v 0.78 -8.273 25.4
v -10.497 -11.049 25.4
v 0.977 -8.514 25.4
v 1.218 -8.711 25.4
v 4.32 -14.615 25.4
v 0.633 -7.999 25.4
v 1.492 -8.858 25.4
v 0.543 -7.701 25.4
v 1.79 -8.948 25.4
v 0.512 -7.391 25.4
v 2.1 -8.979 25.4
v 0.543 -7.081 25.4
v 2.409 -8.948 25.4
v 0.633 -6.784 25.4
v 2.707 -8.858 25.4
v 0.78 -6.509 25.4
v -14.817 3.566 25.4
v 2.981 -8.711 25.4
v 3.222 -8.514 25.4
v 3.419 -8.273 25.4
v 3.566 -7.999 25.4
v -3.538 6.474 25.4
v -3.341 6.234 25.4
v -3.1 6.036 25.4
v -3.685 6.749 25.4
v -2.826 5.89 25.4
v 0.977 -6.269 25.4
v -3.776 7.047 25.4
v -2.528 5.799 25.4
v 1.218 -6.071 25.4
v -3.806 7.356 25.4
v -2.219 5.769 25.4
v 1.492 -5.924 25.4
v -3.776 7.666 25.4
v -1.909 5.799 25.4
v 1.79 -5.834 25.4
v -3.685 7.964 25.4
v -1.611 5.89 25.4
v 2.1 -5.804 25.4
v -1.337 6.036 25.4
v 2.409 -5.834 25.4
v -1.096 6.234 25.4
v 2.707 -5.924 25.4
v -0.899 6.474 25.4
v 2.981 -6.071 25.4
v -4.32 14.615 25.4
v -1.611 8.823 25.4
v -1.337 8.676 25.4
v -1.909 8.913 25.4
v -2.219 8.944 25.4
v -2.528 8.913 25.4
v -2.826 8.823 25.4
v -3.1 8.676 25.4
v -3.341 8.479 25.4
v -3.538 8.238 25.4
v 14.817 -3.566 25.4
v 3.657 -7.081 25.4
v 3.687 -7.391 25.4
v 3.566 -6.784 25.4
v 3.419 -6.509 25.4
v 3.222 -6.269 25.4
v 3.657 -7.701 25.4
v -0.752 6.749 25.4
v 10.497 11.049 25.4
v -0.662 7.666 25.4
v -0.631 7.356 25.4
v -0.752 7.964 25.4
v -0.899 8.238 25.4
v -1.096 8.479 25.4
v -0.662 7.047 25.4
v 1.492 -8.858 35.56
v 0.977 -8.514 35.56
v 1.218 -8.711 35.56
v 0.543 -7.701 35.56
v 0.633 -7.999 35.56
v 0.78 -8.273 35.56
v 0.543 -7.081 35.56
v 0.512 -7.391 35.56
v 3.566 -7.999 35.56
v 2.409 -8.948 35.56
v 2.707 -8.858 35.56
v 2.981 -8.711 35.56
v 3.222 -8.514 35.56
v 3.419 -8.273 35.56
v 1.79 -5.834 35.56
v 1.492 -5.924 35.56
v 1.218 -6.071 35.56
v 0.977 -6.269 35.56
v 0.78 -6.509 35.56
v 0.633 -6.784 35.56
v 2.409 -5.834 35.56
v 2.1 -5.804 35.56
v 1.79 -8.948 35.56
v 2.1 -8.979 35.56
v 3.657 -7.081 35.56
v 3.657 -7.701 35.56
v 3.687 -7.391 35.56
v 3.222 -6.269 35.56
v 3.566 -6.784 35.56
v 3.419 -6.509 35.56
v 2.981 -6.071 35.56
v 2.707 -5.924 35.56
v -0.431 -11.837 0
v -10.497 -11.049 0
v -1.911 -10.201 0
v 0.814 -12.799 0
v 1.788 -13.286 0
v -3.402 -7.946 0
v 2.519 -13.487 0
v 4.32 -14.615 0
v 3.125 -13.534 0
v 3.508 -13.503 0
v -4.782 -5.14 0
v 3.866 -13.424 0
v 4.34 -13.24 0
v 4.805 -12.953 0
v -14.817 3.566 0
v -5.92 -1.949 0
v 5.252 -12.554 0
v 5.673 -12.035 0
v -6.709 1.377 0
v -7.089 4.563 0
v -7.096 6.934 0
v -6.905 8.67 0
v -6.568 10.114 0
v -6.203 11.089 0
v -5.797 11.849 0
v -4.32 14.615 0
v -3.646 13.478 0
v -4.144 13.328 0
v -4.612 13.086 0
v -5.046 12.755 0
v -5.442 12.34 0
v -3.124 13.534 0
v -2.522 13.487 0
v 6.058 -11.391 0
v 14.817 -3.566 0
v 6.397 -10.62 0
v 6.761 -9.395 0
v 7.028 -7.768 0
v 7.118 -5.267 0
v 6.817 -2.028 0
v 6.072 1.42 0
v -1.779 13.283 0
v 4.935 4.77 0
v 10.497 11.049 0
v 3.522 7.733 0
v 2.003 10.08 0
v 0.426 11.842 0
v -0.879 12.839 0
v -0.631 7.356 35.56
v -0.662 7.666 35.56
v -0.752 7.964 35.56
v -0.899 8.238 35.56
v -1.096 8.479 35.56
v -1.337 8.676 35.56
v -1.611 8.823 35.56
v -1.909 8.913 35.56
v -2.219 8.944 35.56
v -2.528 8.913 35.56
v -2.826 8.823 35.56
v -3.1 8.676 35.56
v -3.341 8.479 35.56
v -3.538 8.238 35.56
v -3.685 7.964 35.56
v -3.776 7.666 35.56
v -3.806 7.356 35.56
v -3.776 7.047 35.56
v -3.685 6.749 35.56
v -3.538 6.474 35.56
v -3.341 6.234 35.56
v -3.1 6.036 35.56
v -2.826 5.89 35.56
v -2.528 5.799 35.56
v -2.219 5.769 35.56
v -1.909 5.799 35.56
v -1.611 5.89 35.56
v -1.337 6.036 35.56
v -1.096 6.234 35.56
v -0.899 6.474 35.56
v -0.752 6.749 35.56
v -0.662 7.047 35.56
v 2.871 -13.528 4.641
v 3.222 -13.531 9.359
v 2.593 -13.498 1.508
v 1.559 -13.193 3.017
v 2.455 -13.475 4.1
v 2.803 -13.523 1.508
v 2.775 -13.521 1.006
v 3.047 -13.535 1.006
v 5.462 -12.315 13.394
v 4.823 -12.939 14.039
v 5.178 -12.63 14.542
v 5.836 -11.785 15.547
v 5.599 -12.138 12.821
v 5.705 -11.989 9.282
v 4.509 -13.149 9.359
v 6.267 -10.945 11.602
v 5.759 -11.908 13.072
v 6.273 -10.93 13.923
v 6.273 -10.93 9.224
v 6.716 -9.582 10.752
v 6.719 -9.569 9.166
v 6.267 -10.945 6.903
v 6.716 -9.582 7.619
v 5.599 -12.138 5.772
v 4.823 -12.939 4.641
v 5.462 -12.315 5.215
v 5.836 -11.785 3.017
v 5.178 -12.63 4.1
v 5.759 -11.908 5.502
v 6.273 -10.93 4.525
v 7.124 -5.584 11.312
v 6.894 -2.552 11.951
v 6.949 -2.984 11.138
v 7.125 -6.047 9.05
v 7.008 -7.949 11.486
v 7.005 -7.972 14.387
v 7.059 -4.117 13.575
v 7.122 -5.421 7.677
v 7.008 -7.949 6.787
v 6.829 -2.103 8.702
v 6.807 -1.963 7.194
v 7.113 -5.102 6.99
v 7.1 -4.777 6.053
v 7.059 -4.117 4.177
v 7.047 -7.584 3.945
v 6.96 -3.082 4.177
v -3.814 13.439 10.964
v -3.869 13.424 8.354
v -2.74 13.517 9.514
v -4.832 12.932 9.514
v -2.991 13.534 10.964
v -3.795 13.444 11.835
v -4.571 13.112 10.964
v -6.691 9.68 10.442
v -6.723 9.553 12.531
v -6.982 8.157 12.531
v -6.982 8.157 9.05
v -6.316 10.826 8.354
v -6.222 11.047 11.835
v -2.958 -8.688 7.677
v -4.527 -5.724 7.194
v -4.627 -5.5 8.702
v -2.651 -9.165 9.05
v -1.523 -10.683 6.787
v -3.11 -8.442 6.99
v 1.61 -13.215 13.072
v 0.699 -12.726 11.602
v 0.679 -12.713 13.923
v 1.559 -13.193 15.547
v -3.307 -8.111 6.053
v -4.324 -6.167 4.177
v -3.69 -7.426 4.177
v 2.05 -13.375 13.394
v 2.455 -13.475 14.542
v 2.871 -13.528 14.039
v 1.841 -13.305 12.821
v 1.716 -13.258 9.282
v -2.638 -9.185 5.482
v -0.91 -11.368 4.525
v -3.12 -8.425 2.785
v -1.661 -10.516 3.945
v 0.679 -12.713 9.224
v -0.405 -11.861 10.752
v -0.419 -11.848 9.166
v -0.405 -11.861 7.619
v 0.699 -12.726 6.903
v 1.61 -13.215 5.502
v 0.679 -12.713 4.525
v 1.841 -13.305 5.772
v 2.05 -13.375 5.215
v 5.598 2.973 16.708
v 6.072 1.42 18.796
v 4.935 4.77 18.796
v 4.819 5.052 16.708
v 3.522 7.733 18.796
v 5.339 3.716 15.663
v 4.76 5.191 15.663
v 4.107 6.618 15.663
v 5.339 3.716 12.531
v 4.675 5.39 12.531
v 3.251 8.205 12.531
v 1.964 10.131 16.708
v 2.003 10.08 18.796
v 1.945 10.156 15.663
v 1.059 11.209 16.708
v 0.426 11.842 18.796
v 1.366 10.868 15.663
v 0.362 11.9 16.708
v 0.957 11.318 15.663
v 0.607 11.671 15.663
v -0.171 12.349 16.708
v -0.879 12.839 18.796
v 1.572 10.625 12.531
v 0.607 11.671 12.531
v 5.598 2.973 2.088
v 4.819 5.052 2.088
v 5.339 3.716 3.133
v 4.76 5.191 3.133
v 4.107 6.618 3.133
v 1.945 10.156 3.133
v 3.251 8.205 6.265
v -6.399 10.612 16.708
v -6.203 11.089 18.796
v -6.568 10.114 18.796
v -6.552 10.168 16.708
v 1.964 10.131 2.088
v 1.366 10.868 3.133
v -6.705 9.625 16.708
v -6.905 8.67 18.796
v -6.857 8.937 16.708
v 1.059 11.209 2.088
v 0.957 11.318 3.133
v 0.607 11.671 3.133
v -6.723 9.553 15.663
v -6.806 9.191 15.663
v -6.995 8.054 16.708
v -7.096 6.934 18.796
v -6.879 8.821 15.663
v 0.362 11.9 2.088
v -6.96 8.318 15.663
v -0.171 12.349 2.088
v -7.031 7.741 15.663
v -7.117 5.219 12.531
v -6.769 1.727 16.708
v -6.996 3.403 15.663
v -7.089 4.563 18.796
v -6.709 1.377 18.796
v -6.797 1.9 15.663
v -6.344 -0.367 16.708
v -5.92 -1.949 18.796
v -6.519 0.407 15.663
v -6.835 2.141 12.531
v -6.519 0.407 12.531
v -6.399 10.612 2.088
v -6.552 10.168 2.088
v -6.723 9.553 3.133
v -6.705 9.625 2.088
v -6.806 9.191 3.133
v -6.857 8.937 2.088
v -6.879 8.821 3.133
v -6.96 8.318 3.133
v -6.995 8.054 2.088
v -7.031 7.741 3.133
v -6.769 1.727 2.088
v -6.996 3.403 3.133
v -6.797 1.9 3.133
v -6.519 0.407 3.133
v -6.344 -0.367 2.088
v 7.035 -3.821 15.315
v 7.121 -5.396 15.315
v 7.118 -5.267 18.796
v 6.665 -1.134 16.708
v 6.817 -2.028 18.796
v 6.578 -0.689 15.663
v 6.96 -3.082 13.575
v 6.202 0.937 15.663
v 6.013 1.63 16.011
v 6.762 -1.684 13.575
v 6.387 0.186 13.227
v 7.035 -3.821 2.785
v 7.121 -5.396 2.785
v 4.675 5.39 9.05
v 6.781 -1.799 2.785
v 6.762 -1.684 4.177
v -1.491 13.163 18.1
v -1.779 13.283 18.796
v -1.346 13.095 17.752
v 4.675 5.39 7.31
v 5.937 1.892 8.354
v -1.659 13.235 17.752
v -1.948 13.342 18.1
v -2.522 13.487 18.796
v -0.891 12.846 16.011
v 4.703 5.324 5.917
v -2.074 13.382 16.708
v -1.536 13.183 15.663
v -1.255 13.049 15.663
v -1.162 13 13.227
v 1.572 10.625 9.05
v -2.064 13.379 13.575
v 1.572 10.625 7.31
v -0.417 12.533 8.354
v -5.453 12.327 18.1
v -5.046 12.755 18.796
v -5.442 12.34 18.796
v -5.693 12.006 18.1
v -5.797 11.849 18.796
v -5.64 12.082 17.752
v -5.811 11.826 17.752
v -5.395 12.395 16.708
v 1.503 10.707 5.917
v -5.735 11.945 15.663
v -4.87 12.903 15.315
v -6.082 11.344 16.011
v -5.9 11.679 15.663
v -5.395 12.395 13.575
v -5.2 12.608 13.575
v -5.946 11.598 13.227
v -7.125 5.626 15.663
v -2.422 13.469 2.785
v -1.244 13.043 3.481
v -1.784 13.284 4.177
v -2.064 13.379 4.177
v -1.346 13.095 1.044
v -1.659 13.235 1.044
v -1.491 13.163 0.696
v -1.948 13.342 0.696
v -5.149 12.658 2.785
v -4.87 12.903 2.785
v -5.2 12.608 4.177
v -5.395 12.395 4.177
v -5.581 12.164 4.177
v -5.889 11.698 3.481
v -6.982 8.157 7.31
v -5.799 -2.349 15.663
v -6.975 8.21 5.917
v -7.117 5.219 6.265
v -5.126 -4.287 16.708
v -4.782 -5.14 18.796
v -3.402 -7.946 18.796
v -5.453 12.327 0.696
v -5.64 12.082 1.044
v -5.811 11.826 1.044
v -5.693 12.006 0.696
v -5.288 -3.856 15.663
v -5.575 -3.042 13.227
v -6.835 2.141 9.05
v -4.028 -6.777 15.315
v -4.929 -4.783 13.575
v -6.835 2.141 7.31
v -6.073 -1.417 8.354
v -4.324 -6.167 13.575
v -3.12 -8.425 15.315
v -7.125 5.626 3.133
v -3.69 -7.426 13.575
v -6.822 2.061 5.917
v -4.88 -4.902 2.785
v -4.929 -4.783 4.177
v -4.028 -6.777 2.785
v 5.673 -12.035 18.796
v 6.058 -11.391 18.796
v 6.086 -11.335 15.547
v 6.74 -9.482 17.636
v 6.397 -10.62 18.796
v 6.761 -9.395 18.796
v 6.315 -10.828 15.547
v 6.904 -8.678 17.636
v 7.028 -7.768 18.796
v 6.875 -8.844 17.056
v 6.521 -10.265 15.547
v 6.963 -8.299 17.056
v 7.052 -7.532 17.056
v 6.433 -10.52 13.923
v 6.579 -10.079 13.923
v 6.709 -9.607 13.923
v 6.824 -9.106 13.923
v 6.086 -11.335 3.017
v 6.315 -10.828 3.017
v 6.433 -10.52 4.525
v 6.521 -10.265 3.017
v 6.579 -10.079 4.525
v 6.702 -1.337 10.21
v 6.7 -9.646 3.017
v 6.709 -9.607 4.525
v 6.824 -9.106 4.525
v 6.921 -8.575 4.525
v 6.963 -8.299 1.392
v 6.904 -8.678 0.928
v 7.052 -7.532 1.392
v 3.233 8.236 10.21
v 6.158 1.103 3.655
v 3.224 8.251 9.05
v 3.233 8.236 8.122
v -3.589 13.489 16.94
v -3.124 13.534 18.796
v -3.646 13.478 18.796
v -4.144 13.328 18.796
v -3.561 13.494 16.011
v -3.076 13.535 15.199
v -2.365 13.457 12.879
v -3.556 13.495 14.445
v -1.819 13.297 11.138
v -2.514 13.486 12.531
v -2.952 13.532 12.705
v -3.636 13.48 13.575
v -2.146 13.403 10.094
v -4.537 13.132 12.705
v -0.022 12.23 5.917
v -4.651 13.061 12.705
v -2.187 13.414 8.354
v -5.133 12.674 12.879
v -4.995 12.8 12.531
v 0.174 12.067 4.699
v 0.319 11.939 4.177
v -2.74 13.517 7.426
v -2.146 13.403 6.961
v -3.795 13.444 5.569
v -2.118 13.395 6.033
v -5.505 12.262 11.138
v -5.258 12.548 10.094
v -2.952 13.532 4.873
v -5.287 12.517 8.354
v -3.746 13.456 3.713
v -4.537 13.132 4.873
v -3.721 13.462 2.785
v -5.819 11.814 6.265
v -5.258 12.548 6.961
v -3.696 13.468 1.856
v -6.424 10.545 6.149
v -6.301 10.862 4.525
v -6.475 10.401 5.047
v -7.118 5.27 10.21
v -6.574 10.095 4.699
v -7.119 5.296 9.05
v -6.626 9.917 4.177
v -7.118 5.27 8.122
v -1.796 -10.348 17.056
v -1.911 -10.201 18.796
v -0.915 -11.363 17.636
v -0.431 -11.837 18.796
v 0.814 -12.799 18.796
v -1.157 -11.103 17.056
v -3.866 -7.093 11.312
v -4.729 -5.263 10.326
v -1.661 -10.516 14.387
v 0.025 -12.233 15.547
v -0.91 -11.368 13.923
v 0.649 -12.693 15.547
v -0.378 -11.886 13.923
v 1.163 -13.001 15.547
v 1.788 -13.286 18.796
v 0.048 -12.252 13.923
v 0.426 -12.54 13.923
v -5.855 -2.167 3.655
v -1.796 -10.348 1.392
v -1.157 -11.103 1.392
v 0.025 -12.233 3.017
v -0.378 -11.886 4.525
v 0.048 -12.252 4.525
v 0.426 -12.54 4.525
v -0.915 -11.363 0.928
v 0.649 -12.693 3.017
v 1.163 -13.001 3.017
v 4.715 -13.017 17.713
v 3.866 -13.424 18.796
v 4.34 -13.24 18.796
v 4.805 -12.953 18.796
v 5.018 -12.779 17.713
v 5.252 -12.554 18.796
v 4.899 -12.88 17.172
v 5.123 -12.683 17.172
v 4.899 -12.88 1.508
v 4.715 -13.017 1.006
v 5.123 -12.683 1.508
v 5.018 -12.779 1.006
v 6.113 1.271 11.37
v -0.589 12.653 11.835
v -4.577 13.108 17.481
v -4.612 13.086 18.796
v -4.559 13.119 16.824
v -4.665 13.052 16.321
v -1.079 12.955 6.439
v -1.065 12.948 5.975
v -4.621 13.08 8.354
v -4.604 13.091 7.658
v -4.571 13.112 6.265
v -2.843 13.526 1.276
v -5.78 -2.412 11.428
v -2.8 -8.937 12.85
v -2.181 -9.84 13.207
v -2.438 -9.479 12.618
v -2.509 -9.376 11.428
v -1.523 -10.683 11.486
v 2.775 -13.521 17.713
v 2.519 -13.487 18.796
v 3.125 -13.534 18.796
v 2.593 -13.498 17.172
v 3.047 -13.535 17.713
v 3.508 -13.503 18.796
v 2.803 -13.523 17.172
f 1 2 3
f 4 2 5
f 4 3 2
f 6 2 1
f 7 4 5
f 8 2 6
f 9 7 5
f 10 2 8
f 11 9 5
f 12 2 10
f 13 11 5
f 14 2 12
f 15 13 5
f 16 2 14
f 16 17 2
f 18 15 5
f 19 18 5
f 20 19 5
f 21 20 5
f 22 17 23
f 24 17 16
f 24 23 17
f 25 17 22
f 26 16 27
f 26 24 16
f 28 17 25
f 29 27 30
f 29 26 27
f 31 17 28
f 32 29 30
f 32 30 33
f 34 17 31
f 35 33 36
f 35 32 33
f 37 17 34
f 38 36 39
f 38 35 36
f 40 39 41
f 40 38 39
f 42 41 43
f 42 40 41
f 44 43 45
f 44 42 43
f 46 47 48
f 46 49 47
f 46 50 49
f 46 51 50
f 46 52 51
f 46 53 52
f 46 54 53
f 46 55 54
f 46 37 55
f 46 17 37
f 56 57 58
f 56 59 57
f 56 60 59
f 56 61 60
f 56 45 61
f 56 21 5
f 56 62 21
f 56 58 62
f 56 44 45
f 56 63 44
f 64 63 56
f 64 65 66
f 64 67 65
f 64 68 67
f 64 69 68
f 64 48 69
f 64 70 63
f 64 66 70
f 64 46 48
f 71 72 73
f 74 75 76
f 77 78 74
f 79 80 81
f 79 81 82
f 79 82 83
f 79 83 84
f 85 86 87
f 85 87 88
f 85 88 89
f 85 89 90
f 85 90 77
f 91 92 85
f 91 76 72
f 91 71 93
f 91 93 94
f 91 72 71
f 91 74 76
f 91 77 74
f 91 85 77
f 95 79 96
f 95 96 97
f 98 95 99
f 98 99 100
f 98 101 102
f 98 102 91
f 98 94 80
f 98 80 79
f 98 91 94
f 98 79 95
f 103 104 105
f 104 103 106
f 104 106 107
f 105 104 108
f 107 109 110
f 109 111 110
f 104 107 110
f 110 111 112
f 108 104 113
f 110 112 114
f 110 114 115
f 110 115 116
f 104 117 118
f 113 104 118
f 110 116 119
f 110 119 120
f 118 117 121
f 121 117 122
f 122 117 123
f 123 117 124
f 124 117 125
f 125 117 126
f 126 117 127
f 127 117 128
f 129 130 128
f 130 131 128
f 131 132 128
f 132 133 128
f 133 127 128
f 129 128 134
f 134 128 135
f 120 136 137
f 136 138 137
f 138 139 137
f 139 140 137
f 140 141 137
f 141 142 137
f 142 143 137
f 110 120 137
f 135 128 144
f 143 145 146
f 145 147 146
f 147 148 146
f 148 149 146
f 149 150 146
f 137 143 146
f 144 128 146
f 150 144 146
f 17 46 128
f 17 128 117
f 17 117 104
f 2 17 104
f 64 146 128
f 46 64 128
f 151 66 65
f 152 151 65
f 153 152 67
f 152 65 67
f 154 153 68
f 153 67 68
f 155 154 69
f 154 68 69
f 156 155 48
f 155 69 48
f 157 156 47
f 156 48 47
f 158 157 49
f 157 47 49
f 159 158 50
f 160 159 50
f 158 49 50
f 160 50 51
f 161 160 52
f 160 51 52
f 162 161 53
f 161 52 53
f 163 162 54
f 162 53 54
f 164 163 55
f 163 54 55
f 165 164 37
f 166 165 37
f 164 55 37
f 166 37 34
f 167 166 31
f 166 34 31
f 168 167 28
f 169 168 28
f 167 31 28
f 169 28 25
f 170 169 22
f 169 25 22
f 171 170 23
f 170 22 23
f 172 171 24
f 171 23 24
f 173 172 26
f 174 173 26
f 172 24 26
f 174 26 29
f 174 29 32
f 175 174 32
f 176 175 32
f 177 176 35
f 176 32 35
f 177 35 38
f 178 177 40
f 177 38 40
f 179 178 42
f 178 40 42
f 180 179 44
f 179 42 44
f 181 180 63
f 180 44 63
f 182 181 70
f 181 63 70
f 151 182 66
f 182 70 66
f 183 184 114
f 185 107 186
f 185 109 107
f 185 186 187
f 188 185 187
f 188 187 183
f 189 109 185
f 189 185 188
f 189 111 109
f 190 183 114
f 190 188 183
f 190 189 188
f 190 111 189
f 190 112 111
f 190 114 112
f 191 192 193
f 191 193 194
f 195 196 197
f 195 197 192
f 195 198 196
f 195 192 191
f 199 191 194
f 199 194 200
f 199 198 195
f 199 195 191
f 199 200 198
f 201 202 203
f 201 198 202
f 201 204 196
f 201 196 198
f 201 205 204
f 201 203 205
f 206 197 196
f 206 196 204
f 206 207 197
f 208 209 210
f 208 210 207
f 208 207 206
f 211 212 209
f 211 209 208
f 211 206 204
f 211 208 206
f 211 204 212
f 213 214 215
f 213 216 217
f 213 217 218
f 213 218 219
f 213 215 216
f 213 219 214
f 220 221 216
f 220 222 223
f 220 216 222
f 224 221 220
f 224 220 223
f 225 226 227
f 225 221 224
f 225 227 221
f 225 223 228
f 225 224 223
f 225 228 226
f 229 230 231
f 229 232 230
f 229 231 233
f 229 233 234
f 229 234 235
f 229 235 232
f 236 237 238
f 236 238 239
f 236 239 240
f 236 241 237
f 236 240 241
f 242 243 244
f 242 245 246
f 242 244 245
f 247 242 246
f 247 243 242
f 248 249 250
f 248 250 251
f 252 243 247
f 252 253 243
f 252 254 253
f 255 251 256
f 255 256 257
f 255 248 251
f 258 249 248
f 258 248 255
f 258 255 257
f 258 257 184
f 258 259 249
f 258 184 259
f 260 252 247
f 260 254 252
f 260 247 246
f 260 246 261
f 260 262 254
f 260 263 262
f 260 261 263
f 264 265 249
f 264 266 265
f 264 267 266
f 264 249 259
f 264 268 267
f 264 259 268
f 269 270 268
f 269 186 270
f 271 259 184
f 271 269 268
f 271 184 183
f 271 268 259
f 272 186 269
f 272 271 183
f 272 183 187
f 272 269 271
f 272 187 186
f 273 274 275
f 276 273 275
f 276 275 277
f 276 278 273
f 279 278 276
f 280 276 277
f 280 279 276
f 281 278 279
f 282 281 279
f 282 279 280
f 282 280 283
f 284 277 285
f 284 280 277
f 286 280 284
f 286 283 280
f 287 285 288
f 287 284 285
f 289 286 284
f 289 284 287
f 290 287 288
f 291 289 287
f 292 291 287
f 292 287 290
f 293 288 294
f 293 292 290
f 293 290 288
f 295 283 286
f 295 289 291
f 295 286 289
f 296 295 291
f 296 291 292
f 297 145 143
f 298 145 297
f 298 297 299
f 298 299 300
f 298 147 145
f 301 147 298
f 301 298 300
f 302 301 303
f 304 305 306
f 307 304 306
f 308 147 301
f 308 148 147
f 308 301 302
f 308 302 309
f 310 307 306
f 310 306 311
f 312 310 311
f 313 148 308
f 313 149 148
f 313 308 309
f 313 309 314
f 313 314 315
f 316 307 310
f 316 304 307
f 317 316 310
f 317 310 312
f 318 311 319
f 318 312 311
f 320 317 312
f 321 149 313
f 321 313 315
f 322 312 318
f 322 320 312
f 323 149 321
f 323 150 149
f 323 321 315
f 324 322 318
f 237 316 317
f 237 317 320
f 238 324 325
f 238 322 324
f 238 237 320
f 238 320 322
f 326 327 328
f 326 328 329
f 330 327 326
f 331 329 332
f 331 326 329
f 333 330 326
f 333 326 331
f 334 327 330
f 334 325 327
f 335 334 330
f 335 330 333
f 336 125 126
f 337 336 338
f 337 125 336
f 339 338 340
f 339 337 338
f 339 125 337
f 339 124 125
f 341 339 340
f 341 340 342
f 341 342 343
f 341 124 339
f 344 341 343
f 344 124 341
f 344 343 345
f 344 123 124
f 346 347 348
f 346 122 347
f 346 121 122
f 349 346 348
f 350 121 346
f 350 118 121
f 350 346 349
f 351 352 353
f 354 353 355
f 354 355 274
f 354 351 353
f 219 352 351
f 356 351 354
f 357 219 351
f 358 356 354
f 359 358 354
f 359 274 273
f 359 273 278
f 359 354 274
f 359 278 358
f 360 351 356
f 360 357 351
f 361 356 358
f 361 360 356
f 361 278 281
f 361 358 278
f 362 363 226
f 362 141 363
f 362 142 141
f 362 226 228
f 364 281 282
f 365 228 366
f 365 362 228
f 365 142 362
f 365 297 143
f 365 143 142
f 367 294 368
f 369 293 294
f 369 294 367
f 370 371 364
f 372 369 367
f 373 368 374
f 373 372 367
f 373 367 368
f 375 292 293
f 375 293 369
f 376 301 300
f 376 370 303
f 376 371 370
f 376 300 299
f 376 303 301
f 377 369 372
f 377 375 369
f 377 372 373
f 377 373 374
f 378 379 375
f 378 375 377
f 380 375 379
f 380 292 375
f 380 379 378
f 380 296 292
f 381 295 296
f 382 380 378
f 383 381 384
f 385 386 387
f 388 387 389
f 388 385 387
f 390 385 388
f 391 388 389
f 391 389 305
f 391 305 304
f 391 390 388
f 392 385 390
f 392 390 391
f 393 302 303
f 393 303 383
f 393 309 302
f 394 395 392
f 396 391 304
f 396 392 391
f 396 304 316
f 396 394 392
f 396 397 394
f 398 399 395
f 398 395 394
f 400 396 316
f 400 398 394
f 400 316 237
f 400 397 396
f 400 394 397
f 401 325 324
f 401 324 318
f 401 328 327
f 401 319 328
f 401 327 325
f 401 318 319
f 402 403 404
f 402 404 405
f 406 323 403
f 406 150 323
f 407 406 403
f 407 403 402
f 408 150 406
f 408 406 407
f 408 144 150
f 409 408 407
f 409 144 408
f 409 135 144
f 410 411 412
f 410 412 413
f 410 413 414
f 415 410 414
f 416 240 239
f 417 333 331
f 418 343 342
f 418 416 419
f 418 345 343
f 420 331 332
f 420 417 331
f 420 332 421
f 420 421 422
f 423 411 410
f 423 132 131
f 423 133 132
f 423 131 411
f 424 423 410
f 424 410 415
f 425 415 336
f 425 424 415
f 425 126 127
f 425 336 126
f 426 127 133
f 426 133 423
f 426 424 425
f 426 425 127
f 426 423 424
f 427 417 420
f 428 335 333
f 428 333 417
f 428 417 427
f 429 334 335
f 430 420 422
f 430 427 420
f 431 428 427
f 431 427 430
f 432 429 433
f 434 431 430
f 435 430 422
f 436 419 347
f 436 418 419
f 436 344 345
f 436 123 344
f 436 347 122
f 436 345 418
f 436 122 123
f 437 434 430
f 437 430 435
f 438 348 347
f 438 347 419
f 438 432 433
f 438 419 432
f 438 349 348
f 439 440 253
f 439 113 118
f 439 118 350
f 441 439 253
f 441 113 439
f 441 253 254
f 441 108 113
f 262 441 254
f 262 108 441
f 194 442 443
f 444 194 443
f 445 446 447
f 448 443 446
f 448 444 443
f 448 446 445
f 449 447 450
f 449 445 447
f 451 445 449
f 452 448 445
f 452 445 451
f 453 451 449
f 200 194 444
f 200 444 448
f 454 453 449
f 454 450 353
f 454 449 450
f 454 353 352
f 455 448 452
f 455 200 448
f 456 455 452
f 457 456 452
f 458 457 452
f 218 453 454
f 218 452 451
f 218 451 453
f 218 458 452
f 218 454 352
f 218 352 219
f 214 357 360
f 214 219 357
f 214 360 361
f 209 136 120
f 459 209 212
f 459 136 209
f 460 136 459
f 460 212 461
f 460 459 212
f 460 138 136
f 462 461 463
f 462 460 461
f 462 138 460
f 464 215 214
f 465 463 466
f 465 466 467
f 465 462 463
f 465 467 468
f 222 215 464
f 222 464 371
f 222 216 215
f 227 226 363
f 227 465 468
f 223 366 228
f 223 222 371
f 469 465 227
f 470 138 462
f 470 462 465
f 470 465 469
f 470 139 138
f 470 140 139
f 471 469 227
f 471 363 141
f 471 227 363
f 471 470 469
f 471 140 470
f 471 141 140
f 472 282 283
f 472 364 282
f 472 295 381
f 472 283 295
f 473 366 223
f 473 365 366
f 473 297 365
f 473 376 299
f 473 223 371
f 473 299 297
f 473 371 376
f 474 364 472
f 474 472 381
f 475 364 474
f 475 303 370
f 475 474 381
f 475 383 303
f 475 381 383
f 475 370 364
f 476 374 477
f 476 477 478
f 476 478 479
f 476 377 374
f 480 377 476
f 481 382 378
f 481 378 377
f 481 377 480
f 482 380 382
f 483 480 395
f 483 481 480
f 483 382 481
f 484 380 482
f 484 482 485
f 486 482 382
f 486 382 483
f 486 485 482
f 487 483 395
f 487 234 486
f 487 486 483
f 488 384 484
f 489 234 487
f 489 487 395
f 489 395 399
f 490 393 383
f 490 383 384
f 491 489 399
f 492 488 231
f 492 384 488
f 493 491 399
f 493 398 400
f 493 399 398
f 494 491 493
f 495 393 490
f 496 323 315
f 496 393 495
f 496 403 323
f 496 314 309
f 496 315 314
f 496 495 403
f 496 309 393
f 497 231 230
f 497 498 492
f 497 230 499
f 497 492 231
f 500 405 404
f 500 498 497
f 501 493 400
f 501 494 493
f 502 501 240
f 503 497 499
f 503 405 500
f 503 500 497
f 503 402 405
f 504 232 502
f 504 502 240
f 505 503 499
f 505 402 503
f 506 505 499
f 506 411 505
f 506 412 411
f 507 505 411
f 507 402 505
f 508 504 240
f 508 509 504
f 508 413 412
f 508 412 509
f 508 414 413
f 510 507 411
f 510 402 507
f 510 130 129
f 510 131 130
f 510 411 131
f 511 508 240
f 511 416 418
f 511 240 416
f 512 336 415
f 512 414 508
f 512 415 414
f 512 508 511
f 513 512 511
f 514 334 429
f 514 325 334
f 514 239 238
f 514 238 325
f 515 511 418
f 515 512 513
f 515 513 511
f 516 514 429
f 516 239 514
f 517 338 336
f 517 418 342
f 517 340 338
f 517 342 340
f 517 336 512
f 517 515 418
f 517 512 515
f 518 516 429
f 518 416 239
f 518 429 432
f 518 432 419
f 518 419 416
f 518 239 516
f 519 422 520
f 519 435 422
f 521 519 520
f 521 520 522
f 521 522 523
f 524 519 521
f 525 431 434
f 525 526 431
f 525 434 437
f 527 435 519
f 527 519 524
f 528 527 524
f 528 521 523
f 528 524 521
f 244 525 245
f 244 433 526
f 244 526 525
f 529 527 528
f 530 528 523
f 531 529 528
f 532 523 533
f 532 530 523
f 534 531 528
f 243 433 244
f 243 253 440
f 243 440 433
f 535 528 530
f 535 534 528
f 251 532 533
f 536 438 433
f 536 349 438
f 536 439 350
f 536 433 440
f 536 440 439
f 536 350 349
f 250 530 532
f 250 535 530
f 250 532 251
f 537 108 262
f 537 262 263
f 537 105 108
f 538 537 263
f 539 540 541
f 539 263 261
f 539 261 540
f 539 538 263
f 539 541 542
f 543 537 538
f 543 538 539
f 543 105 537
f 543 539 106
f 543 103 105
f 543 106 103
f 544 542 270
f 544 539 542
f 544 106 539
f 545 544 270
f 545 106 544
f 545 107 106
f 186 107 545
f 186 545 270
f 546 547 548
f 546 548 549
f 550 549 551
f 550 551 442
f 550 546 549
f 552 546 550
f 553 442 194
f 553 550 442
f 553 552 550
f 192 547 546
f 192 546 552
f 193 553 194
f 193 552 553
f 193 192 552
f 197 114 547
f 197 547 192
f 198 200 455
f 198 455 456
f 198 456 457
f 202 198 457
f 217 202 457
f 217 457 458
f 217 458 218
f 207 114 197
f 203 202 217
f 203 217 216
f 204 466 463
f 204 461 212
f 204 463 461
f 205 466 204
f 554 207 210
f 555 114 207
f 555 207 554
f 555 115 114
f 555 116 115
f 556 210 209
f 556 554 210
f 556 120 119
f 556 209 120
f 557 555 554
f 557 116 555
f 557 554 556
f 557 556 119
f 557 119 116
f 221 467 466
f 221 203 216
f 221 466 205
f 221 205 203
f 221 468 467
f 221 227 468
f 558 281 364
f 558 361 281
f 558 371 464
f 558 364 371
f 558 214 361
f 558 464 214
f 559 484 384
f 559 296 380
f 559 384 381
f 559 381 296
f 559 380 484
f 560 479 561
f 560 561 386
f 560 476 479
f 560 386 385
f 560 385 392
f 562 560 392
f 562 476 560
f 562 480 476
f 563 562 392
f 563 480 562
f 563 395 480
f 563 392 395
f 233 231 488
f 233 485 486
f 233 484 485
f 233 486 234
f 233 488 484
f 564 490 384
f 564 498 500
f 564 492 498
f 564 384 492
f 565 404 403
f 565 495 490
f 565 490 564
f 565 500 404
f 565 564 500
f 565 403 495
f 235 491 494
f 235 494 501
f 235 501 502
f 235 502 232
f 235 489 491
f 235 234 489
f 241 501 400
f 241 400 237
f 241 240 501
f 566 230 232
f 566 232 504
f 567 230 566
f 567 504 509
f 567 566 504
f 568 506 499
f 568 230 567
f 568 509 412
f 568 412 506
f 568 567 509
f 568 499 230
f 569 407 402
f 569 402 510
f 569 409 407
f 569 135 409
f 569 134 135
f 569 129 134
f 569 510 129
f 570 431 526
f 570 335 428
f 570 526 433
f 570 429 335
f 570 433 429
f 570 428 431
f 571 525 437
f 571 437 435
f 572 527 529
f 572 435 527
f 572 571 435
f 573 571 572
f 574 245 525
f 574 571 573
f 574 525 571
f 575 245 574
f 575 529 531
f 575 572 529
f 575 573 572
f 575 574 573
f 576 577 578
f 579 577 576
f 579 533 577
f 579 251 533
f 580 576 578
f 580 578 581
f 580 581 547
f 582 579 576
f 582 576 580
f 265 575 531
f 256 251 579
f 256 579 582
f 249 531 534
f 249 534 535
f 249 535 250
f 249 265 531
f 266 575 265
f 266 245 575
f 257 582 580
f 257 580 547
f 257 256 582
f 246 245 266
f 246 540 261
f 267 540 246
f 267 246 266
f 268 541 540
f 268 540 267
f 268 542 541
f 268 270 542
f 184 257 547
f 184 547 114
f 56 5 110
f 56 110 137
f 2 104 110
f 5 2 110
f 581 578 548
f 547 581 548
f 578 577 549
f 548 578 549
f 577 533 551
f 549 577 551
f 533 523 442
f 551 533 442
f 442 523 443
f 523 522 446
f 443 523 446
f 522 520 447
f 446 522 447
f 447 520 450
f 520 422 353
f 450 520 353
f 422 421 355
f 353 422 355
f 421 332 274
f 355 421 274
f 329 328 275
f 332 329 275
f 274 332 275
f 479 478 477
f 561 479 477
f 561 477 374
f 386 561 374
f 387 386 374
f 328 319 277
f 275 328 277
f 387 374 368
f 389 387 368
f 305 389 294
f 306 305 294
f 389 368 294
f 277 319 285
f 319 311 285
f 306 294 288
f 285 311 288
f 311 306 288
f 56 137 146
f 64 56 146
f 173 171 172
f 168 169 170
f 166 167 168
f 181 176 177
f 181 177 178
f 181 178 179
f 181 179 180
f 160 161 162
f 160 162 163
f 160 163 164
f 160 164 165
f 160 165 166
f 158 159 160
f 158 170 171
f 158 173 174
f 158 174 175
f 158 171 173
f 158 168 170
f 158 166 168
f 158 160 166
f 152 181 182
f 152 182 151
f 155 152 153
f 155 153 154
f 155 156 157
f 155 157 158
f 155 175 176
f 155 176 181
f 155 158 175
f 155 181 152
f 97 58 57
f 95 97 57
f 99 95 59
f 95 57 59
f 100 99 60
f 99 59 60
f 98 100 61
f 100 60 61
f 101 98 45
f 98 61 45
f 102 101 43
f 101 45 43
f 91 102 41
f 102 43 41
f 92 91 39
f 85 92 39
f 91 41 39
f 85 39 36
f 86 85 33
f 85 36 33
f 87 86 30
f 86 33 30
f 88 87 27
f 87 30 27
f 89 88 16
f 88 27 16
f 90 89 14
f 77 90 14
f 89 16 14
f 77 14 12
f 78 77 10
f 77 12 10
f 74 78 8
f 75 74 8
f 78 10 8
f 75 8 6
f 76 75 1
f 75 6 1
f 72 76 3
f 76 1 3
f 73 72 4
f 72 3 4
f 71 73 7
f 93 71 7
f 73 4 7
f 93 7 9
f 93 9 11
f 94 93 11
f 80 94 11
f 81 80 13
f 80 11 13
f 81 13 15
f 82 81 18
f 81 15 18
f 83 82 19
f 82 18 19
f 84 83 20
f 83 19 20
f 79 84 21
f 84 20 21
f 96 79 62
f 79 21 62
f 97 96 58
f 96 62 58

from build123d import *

# Parameters (mm, degrees)
F2_DEPTH = 25.4
F3_DEPTH = 18.796
F4_R     = 1.5875
F6_DEPTH = 10.16
F5_R     = 1.5875
F7_DEPTH = 10.16


with BuildPart() as f2:
    # F0 (on Top) → F2 (new body)
    with BuildSketch(Plane.XY):
        Polygon((4.320436, -14.614768), (14.816978, -3.565776), (10.496542, 11.048991), (-4.320436, 14.614768), (-14.816978, 3.565776), (-10.496542, -11.048991), align=None)
    extrude(amount=F2_DEPTH)

    # F1 (on face) → F3 (cut)
    with BuildSketch(Plane.XY):
        with BuildLine():
            add(Edge.make_bspline(
                [(3.865747, -13.424489), (14.234036, -10.438812), (3.251271, 8.205083), (-7.731494, 26.848978), (-7.117018, 5.219406), (-6.502543, -16.410165), (3.865747, -13.424489)],
                knots=[0, 0, 0, 2.094395, 2.094395, 4.18879, 4.18879, 6.283185, 6.283185, 6.283185], degree=2, weights=[1, 0.5, 1, 0.5, 1, 0.5, 1]))
        make_face()
    extrude(amount=F3_DEPTH, mode=Mode.SUBTRACT)

    # F4 (on face) → F6 (join)
    with BuildSketch(Plane.XY.offset(25.4)):
        with Locations((-2.218525, 7.356244)):
            Circle(F4_R)
    extrude(amount=F6_DEPTH)

    # F5 (on face) → F7 (join)
    with BuildSketch(Plane.XY.offset(25.4)):
        with Locations((2.099516, -7.391089)):
            Circle(F5_R)
    extrude(amount=F7_DEPTH)


solid = f2.part
